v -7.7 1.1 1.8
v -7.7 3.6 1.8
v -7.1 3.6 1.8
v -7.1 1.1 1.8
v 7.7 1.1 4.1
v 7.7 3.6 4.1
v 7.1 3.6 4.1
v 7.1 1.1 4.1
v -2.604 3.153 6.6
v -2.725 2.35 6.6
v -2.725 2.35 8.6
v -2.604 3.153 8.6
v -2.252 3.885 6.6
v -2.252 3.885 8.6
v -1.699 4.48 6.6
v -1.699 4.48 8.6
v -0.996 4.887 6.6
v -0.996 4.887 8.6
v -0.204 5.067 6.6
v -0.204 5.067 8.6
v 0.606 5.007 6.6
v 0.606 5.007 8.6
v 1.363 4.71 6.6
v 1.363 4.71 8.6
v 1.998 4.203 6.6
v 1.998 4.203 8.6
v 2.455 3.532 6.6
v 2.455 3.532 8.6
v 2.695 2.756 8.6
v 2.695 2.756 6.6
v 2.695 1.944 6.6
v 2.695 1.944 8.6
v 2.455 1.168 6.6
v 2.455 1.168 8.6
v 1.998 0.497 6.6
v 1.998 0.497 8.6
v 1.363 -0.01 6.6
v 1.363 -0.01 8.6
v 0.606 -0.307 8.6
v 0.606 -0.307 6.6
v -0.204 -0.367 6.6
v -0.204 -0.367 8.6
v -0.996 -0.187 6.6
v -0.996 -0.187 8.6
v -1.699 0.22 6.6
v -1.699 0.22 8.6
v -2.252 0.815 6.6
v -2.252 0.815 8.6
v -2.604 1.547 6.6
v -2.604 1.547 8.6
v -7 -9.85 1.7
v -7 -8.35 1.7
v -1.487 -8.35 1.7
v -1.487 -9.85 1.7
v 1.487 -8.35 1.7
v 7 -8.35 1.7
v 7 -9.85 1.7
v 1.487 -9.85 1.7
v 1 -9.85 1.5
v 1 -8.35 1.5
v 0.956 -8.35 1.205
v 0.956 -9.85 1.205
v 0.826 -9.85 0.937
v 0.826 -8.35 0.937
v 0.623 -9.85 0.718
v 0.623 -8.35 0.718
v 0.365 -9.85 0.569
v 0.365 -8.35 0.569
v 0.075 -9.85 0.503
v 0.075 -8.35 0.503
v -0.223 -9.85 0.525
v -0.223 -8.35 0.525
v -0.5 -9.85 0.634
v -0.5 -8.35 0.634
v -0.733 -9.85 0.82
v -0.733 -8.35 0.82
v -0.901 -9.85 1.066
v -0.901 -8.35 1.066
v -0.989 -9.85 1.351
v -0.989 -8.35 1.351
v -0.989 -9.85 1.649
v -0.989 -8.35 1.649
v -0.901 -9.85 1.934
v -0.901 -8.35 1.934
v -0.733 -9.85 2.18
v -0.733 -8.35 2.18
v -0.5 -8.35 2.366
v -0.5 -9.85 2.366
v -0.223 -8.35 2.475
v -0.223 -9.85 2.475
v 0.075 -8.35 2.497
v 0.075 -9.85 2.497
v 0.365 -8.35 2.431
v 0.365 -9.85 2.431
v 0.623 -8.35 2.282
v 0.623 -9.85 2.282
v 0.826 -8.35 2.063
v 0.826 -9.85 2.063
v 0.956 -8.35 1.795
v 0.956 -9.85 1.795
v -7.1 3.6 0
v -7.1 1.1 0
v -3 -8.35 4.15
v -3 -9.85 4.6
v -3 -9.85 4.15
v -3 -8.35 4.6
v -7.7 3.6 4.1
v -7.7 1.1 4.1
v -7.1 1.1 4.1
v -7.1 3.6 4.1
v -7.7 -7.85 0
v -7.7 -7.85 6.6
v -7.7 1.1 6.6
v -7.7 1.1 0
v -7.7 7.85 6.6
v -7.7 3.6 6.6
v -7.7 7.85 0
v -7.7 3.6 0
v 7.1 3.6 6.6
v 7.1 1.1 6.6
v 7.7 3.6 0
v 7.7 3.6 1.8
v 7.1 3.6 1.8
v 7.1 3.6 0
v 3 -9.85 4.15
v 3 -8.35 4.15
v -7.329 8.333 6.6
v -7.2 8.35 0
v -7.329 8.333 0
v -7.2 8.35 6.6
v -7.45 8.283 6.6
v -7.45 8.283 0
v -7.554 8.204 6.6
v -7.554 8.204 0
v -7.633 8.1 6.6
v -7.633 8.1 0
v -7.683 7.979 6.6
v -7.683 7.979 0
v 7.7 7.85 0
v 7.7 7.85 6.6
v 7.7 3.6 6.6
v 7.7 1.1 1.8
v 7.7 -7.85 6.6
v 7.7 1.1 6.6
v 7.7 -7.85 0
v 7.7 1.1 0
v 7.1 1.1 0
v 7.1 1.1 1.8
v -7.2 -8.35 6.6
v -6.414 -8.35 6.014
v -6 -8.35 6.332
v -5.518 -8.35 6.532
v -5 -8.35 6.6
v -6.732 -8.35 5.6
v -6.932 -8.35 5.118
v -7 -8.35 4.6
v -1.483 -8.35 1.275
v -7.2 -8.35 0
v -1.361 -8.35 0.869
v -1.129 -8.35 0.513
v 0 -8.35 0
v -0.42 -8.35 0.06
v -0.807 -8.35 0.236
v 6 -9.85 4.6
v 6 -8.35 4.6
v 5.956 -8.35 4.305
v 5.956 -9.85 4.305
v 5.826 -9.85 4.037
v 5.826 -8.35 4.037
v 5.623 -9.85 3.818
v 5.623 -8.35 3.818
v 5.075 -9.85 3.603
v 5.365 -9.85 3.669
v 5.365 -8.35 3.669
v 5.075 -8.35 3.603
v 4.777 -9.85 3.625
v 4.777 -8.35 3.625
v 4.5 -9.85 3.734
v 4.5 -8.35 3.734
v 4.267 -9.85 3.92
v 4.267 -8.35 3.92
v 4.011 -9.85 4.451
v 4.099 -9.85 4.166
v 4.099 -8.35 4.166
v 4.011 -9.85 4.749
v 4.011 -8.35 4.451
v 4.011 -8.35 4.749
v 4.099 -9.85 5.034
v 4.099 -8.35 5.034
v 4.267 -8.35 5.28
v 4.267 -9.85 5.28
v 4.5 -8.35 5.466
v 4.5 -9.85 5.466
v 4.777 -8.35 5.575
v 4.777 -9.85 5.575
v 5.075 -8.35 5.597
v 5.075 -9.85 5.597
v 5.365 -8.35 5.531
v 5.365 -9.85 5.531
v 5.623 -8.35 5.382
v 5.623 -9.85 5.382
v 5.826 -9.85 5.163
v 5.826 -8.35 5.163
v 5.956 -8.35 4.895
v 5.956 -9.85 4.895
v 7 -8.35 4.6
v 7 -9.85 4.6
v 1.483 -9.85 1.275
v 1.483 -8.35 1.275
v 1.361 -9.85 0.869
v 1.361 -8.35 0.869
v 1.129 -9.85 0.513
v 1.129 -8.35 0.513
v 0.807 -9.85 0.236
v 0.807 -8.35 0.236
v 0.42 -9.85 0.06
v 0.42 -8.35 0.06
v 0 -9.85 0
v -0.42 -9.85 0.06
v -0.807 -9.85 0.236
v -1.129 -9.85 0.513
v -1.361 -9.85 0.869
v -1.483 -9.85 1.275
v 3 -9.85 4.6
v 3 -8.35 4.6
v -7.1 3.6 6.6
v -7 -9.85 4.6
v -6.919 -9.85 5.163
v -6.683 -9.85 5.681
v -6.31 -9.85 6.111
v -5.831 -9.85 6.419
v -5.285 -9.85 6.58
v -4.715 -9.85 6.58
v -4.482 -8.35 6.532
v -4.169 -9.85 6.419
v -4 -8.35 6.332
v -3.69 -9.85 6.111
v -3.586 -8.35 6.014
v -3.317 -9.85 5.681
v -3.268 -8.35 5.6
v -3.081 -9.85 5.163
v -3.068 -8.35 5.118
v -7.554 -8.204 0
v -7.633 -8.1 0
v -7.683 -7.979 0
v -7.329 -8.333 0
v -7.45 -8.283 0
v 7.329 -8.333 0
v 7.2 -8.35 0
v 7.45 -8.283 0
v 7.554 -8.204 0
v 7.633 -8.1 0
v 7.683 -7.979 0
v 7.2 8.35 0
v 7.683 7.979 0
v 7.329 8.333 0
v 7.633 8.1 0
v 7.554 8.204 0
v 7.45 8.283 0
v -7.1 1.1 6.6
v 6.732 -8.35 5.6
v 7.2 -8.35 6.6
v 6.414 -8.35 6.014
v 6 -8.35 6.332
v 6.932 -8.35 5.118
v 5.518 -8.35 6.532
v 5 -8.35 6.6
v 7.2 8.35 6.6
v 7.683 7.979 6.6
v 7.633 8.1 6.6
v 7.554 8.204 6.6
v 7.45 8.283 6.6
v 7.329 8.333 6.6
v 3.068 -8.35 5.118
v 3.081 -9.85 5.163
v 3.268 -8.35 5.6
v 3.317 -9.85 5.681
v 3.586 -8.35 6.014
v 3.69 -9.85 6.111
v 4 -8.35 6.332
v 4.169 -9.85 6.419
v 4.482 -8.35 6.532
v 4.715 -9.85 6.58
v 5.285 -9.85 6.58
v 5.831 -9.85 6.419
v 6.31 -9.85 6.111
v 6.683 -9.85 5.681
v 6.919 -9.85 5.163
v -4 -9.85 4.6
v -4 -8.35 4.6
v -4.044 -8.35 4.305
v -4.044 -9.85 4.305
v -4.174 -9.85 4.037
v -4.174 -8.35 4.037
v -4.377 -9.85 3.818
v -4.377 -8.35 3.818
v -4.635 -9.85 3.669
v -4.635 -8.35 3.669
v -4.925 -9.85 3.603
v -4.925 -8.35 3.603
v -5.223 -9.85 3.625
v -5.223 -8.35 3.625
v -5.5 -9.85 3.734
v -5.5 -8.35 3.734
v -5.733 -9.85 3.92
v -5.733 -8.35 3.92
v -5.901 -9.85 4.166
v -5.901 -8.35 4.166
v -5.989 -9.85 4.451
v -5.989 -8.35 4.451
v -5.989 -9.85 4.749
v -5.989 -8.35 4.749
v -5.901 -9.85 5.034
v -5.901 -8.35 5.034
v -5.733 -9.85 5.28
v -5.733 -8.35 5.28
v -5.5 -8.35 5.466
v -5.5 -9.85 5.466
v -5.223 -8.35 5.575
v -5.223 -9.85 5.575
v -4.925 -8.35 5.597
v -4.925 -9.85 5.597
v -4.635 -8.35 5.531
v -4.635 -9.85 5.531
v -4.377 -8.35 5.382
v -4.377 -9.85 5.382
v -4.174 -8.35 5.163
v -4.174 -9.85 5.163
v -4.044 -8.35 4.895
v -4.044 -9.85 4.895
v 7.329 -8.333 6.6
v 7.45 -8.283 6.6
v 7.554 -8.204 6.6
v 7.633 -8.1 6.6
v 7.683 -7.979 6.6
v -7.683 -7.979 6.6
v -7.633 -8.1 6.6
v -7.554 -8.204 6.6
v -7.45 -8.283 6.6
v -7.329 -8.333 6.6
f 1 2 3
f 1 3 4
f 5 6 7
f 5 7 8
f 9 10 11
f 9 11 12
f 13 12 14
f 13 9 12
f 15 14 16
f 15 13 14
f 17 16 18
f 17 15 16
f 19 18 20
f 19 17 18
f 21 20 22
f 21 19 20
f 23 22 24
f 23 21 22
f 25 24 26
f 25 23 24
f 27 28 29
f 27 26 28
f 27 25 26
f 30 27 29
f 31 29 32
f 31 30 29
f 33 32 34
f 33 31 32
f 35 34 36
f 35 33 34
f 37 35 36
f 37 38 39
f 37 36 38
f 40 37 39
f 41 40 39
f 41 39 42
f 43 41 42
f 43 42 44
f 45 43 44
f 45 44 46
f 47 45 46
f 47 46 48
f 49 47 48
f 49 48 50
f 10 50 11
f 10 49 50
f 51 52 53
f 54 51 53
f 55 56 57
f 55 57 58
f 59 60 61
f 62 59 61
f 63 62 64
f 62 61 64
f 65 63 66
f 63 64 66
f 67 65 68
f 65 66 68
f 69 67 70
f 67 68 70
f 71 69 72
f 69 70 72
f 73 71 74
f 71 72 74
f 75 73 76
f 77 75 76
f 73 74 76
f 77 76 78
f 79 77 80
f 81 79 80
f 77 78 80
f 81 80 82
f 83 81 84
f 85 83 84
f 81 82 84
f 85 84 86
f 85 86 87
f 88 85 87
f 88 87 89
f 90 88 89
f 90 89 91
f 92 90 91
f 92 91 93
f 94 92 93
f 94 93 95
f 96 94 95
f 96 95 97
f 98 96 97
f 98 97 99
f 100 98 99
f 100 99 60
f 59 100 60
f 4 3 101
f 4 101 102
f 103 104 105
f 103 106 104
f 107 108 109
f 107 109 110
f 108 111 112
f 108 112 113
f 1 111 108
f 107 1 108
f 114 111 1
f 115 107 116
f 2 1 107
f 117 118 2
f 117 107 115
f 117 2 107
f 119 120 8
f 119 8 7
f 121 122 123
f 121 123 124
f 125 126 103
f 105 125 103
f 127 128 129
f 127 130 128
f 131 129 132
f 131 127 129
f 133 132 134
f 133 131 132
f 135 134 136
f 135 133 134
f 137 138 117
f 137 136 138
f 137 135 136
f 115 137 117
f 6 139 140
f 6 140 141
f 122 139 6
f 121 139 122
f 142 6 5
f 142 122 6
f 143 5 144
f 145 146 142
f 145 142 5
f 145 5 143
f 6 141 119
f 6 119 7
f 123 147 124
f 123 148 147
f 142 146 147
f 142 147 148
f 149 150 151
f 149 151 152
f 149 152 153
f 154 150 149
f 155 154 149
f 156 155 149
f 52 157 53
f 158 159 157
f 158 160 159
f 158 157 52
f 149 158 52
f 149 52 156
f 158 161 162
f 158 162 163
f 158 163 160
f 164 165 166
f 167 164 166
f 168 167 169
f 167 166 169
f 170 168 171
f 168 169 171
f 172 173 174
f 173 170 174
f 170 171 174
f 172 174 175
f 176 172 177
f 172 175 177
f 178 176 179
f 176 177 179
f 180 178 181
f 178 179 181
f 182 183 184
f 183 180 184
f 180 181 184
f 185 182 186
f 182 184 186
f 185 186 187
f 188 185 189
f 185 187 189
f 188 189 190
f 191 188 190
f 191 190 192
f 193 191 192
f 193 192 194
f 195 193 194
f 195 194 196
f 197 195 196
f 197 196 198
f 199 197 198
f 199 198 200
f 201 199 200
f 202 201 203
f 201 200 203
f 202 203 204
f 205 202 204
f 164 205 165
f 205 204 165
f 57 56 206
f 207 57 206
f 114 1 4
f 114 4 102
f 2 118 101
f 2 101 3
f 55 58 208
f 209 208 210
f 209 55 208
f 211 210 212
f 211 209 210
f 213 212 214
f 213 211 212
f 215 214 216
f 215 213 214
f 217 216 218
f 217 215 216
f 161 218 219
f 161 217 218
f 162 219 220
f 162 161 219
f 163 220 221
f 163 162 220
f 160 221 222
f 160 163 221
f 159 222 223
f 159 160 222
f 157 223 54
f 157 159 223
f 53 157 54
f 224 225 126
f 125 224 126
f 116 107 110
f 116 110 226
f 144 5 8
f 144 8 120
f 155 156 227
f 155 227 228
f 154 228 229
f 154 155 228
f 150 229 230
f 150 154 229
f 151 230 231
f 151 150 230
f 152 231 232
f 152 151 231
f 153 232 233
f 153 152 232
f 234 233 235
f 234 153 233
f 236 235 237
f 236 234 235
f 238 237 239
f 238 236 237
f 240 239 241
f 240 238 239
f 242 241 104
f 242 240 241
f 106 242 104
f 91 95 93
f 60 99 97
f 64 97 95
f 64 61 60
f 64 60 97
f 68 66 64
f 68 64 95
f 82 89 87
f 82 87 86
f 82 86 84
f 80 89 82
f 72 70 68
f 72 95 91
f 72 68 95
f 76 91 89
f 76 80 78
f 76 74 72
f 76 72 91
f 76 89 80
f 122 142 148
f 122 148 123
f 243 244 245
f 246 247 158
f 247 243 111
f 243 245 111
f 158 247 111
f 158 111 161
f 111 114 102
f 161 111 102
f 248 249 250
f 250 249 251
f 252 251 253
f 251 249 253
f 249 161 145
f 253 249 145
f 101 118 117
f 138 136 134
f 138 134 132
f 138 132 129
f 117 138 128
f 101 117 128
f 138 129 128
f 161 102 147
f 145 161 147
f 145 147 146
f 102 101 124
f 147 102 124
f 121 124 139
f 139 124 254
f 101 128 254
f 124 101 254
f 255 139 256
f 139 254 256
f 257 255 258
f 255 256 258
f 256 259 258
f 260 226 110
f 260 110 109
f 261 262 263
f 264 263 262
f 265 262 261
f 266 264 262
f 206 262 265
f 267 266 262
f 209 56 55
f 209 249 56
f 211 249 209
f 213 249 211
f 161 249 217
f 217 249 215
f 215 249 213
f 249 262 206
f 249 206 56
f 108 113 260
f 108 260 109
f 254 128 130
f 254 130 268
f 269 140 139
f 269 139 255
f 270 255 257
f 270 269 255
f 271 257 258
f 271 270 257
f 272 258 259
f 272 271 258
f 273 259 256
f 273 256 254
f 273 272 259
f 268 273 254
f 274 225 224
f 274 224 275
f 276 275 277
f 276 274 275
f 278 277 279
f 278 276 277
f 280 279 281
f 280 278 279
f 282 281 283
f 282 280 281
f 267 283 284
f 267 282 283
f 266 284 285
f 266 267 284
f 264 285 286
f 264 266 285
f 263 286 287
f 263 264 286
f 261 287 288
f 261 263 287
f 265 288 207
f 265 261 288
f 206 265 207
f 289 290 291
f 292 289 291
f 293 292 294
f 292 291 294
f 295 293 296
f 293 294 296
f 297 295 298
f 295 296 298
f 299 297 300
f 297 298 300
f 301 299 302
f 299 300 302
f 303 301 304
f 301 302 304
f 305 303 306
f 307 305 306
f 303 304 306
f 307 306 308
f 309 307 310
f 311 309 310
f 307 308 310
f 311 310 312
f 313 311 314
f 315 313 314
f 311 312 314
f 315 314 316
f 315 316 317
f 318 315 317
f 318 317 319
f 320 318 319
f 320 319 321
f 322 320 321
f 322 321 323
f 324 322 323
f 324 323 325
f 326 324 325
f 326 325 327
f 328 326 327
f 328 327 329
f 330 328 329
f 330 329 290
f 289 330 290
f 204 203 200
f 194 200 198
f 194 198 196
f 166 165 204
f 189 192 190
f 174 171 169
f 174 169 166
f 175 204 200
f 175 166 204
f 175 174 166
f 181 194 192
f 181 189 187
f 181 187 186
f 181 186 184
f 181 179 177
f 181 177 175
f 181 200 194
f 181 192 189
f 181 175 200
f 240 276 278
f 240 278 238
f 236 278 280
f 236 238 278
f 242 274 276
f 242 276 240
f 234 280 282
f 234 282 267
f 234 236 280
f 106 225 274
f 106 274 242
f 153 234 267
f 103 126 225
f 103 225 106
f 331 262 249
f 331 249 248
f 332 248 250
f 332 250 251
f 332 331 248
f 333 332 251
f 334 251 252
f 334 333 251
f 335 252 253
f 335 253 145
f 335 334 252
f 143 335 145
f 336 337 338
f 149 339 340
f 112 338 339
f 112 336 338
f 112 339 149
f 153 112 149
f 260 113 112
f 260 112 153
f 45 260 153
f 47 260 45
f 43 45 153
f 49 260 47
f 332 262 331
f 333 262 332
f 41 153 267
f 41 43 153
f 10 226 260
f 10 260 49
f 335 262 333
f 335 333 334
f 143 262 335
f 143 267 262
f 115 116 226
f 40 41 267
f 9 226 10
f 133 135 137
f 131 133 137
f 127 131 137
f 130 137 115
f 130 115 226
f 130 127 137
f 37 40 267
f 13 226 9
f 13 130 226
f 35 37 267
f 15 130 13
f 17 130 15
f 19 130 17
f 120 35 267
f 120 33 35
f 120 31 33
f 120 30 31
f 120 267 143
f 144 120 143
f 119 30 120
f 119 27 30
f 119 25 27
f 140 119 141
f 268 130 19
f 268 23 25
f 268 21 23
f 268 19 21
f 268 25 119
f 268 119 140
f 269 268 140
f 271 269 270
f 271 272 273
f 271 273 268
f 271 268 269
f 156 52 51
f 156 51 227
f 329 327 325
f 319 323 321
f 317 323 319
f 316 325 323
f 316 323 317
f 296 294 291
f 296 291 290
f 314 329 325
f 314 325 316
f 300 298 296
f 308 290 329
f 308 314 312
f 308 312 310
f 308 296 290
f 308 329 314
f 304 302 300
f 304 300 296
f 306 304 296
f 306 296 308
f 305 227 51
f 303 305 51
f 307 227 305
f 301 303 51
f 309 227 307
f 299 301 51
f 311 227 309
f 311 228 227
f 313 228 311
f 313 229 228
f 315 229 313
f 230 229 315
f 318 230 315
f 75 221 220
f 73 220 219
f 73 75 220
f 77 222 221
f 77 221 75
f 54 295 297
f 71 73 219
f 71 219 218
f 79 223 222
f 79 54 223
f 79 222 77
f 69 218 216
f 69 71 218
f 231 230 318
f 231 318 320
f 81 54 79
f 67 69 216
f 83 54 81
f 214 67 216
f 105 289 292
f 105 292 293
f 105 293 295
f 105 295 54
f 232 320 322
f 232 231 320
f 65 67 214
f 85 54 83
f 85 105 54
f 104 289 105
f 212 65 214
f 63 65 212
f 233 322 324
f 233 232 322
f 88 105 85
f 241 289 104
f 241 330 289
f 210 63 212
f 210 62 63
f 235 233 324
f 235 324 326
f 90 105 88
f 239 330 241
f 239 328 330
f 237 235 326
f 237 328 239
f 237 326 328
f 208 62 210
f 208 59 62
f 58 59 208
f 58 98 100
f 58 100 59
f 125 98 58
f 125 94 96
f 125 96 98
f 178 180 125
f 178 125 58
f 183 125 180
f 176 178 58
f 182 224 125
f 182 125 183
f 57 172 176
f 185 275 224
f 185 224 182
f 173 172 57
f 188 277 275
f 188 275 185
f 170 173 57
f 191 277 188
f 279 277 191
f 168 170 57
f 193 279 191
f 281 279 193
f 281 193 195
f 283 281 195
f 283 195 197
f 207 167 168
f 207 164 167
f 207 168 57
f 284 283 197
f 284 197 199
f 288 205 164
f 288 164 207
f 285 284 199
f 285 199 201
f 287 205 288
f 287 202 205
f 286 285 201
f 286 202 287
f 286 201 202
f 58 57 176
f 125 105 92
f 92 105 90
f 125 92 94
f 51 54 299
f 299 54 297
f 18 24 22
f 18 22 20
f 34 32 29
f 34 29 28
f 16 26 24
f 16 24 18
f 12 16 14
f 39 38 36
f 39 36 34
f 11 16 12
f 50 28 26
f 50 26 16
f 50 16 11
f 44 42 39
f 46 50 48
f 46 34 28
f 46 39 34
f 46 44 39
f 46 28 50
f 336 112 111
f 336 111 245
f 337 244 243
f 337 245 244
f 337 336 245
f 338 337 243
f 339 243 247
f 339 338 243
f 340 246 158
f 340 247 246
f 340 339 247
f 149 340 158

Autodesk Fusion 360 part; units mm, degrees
sketch "main body" plane through (0, 0, 0) normal (0, 0, 1) x (1, 0, 0)
  line L0 (7.7, -8.35) -> (-7.7, -8.35)
  line L1 (-7.7, -8.35) -> (-7.7, 8.35)
  line L2 (-7.7, 8.35) -> (7.7, 8.35)
  line L3 (7.7, 8.35) -> (7.7, -8.35)
  line L4 (7.7, -8.35) -> (-7.7, 8.35) construction
  line L5 (-7.7, -8.35) -> (7.7, 8.35) construction
  dimension "d1" = 15.4
  dimension "d2" = 16.7
extrude "Extrude1" add sketch "main body" along normal blind 6.6
sketch "top actuator" plane through (0, 0, 6.6) normal (0, 0, 1) x (-1, 0, 0)
  line L0 (-7.7, -8.35) -> (7.7, -8.35)
  line L1 (7.7, -8.35) -> (7.7, 8.35)
  line L2 (7.7, 8.35) -> (-7.7, 8.35)
  line L3 (-7.7, 8.35) -> (-7.7, -8.35)
  circle A0 centre (0, -2.35) radius 2.725
  dimension "d5" = 5.45
  dimension "d6" = 6
extrude "Extrude2" add sketch "top actuator" along normal blind 2 contours A0
fillet "Fillet1" radius 0.5 4 edges at (-7.7, -8.35, 3.3) (7.7, 8.35, 3.3) (7.7, -8.35, 3.3) (-7.7, 8.35, 3.3)
sketch "side cuts" plane through (-7.7, 0, 0) normal (-1, 0, 0) x (0, -1, 0)
  line L0 (-7.85, 6.6) -> (-7.85, 0)
  line L1 (-7.85, 0) -> (7.85, 0)
  line L2 (7.85, 0) -> (7.85, 6.6)
  line L3 (7.85, 6.6) -> (-7.85, 6.6)
  line L4 (-8.35, 0) -> (-8.35, 6.6)
  line L5 (-8.35, 6.6) -> (-8.35, 0)
  line L6 (0.375, 8.6) -> (-5.075, 8.6)
  line L7 (-2.35, 8.6) -> (-2.35, 0) construction
  line L8 (-1.1, 4.1) -> (-3.6, 4.1)
  line L9 (-3.6, 4.1) -> (-3.6, 6.6)
  line L10 (-3.6, 6.6) -> (-1.1, 6.6)
  line L11 (-1.1, 6.6) -> (-1.1, 4.1)
  line L12 (-1.1, 4.1) -> (-3.6, 6.6) construction
  line L13 (-3.6, 4.1) -> (-1.1, 6.6) construction
  line L14 (-1.1, 0) -> (-3.6, 0)
  line L15 (-3.6, 0) -> (-3.6, 1.8)
  line L16 (-3.6, 1.8) -> (-1.1, 1.8)
  line L17 (-1.1, 1.8) -> (-1.1, 0)
  line L18 (-1.1, 0) -> (-3.6, 1.8) construction
  line L19 (-3.6, 0) -> (-1.1, 1.8) construction
  point P0 (-2.35, 5.35)
  point P1 (-2.35, 0.9)
  dimension "d10" = 8.6
  dimension "d11" = 2.5
  dimension "d12" = 2.5
  dimension "d13" = 2.5
  dimension "d14" = 1.8
extrude "Extrude3" cut sketch "side cuts" against normal blind 0.6 contours L3 L8 L9 L10 L11 | L1 L14 L15 L16 L17
mirror "Mirror1" about plane through (0, 0, 0) normal (1, 0, 0) of "Extrude3"
sketch "Sketch4" plane through (0, -8.35, 0) normal (0, -1, 0) x (1, 0, 0)
  line L0 (7.2, 0) -> (7.2, 6.6)
  line L1 (7.2, 6.6) -> (-7.2, 6.6)
  line L2 (-7.2, 6.6) -> (-7.2, 0)
  line L3 (-7.2, 0) -> (7.2, 0)
  line L4 (-7.2, 2.9) -> (7.2, 2.9) construction
  circle A0 centre (-5, 4.6) radius 2
  line L5 (0, 6.6) -> (0, 0) construction
  line L6 (-7, 4.6) -> (-3, 4.6)
  line L7 (-3, 4.6) -> (-3, 1.7)
  line L8 (-3, 1.7) -> (-7, 1.7)
  line L9 (-7, 1.7) -> (-7, 4.6)
  line L10 (-3, 1.7) -> (0, 1.7)
  line L11 (0, 1.7) -> (0, 4.15)
  line L12 (0, 4.15) -> (-3, 4.15)
  line L13 (-3, 4.15) -> (-3, 1.7)
  circle A1 centre (-5, 4.6) radius 1
  circle A2 centre (0, 1.5) radius 1
  circle A3 centre (0, 1.5) radius 1.5
  circle A4 centre (5, 4.6) radius 2
  circle A5 centre (5, 4.6) radius 1
  line L14 (7, 1.7) -> (7, 4.6)
  line L15 (3, 1.7) -> (7, 1.7)
  line L16 (3, 4.6) -> (3, 1.7)
  line L17 (0, 4.15) -> (3, 4.15)
  line L18 (3, 1.7) -> (0, 1.7)
  dimension "d18" = 3.7
  dimension "d19" = 4
  dimension "d20" = 5
  dimension "d21" = 1.7
  dimension "d22" = 2
  dimension "d23" = 2.45
  dimension "d24" = 3
  dimension "d25" = 2
  dimension "d26" = 2
  dimension "d27" = 3
extrude "Extrude4" add sketch "Sketch4" along normal blind 1.5 contours L10 A2 A3 L18 | A4 | L10 L11 A2 A3 | L7 L10 L11 L12 L13 A3 | A0 L6 A1 | A4 L14 L15 L16 | A0 L7 L8 L9 L13 | L11 A2 A3 L18 | L11 A3 L16 L17 L18 | A0 L6 A1
